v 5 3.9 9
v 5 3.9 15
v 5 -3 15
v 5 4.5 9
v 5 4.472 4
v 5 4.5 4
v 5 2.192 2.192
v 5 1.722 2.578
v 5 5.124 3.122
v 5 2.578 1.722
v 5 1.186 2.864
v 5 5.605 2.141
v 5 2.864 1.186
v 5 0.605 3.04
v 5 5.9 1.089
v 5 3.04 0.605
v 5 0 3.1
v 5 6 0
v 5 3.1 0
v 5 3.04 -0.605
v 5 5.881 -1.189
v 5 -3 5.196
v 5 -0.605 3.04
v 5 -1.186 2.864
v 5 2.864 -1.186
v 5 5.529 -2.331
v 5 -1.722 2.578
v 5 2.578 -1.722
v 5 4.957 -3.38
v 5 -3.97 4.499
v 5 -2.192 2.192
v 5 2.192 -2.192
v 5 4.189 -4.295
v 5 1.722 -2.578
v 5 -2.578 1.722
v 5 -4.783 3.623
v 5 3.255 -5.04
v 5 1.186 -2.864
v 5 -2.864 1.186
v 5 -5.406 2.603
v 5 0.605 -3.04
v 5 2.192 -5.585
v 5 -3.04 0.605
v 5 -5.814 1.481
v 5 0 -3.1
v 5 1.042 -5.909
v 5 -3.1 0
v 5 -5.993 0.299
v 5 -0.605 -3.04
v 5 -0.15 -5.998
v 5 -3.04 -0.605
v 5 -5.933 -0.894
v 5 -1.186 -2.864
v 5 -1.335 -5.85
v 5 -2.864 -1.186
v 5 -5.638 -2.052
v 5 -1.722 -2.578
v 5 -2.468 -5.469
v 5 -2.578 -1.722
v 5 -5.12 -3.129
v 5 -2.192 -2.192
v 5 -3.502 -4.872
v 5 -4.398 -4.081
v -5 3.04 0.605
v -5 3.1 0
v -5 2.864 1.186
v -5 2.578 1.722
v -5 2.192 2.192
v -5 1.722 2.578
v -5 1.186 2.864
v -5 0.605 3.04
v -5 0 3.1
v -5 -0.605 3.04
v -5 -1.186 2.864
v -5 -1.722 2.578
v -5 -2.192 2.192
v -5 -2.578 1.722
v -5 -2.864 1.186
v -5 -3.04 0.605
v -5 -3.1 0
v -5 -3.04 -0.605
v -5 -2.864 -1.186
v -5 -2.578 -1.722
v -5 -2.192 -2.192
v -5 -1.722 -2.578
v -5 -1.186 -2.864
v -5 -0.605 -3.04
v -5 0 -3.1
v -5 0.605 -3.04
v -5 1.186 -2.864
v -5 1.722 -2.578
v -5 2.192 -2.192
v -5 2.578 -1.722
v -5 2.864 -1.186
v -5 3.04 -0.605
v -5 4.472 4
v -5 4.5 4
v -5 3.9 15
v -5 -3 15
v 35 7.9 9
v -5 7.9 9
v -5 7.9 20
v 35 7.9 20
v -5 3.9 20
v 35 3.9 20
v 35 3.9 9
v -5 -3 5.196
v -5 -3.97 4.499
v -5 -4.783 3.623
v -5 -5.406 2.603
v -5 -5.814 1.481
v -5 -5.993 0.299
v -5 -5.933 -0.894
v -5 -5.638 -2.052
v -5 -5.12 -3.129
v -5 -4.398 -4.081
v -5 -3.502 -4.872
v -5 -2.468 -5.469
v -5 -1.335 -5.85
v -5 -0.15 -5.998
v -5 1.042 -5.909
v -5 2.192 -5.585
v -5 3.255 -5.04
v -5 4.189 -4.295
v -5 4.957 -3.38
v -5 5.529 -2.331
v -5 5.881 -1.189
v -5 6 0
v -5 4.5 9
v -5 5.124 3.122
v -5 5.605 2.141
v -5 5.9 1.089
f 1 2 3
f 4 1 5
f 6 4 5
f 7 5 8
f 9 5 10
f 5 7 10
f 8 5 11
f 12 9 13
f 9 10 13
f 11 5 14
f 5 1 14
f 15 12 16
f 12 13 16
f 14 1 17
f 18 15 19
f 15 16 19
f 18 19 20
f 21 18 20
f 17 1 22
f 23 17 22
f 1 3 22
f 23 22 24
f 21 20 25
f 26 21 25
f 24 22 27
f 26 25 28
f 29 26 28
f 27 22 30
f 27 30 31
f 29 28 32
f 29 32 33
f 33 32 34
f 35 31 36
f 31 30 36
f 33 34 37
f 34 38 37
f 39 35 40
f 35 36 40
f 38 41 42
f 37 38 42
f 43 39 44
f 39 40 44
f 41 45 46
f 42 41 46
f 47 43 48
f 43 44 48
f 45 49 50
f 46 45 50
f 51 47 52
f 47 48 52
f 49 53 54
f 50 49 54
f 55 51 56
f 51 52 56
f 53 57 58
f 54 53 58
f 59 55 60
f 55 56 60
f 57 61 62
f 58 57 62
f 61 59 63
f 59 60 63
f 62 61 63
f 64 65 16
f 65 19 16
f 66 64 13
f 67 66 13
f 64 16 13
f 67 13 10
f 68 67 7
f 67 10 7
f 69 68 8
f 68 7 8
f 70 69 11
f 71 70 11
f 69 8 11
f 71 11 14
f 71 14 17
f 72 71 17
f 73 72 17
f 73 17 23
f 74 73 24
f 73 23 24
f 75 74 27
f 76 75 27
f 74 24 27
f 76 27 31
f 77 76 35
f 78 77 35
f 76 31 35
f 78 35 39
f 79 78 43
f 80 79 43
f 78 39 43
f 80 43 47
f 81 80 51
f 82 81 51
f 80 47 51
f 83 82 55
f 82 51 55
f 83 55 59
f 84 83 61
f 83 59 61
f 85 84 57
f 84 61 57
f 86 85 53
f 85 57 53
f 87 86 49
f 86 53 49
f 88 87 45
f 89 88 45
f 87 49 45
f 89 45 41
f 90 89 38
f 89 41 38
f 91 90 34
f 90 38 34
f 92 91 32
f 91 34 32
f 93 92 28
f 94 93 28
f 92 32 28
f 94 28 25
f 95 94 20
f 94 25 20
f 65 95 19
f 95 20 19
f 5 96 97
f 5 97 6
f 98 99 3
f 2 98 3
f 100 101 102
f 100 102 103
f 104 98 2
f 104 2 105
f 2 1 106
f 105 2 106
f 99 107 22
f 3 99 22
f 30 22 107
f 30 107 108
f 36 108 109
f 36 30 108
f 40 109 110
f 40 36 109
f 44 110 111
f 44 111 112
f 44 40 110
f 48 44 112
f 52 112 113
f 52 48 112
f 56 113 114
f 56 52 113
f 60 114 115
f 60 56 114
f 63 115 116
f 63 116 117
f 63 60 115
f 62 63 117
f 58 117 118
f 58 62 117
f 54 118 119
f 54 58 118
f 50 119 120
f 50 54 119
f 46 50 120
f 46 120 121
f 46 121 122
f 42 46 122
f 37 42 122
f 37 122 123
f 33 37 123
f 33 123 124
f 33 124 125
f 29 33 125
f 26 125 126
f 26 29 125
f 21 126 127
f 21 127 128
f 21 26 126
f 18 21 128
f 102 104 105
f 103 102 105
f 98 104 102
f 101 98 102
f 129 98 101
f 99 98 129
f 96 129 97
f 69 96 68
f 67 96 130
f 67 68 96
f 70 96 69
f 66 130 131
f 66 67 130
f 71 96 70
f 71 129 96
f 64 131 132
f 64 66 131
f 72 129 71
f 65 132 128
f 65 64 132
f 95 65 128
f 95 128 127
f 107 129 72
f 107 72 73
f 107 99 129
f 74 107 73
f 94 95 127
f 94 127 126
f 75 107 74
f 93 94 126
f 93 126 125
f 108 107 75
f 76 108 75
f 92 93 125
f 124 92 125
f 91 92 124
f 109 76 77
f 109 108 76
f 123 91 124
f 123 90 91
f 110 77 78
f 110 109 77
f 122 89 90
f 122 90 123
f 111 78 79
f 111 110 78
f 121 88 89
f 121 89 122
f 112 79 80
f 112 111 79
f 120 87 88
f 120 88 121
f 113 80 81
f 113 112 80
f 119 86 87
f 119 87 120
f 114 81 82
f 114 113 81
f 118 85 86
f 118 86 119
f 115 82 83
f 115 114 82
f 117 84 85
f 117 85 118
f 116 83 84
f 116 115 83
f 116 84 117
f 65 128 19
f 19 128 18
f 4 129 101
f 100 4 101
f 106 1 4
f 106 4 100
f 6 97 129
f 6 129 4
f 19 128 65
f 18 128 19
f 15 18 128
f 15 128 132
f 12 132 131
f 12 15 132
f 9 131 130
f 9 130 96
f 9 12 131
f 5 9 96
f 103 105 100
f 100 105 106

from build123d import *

# Parameters (mm, degrees)
SKETCH1_W           = 10
SKETCH1_H           = 2.9
REVOLVE1_ANGLE      = 359.999695921
BOSS_EXTRUDE1_START = -3
SKETCH2_W           = 10
SKETCH2_H           = 11
BOSS_EXTRUDE1_DEPTH = 7.5
BOSS_EXTRUDE2_START = 3.9
SKETCH3_W           = 40
SKETCH3_H           = 11
BOSS_EXTRUDE2_DEPTH = 4


with BuildPart() as part:
    # Sketch1 → Revolve1 (revolve)
    with BuildSketch(Plane.XY):
        with Locations((0, 4.55)):
            Rectangle(SKETCH1_W, SKETCH1_H)
    revolve(axis=Axis((-5, 0, 0), (1, 0, 0)), revolution_arc=REVOLVE1_ANGLE)

    # Sketch2 → Boss-Extrude1 (add)
    with BuildSketch(Plane(origin=(0, 0, 0), x_dir=(1, 0, 0), z_dir=(0, 1, 0)).offset(BOSS_EXTRUDE1_START)):
        with Locations((0, -9.5)):
            Rectangle(SKETCH2_W, SKETCH2_H)
    extrude(amount=BOSS_EXTRUDE1_DEPTH)

    # Sketch3 → Boss-Extrude2 (add)
    with BuildSketch(Plane(origin=(0, 0, 0), x_dir=(1, 0, 0), z_dir=(0, 1, 0)).offset(BOSS_EXTRUDE2_START)):
        with Locations((15, -14.5)):
            Rectangle(SKETCH3_W, SKETCH3_H)
    extrude(amount=BOSS_EXTRUDE2_DEPTH)


solid = part.part
